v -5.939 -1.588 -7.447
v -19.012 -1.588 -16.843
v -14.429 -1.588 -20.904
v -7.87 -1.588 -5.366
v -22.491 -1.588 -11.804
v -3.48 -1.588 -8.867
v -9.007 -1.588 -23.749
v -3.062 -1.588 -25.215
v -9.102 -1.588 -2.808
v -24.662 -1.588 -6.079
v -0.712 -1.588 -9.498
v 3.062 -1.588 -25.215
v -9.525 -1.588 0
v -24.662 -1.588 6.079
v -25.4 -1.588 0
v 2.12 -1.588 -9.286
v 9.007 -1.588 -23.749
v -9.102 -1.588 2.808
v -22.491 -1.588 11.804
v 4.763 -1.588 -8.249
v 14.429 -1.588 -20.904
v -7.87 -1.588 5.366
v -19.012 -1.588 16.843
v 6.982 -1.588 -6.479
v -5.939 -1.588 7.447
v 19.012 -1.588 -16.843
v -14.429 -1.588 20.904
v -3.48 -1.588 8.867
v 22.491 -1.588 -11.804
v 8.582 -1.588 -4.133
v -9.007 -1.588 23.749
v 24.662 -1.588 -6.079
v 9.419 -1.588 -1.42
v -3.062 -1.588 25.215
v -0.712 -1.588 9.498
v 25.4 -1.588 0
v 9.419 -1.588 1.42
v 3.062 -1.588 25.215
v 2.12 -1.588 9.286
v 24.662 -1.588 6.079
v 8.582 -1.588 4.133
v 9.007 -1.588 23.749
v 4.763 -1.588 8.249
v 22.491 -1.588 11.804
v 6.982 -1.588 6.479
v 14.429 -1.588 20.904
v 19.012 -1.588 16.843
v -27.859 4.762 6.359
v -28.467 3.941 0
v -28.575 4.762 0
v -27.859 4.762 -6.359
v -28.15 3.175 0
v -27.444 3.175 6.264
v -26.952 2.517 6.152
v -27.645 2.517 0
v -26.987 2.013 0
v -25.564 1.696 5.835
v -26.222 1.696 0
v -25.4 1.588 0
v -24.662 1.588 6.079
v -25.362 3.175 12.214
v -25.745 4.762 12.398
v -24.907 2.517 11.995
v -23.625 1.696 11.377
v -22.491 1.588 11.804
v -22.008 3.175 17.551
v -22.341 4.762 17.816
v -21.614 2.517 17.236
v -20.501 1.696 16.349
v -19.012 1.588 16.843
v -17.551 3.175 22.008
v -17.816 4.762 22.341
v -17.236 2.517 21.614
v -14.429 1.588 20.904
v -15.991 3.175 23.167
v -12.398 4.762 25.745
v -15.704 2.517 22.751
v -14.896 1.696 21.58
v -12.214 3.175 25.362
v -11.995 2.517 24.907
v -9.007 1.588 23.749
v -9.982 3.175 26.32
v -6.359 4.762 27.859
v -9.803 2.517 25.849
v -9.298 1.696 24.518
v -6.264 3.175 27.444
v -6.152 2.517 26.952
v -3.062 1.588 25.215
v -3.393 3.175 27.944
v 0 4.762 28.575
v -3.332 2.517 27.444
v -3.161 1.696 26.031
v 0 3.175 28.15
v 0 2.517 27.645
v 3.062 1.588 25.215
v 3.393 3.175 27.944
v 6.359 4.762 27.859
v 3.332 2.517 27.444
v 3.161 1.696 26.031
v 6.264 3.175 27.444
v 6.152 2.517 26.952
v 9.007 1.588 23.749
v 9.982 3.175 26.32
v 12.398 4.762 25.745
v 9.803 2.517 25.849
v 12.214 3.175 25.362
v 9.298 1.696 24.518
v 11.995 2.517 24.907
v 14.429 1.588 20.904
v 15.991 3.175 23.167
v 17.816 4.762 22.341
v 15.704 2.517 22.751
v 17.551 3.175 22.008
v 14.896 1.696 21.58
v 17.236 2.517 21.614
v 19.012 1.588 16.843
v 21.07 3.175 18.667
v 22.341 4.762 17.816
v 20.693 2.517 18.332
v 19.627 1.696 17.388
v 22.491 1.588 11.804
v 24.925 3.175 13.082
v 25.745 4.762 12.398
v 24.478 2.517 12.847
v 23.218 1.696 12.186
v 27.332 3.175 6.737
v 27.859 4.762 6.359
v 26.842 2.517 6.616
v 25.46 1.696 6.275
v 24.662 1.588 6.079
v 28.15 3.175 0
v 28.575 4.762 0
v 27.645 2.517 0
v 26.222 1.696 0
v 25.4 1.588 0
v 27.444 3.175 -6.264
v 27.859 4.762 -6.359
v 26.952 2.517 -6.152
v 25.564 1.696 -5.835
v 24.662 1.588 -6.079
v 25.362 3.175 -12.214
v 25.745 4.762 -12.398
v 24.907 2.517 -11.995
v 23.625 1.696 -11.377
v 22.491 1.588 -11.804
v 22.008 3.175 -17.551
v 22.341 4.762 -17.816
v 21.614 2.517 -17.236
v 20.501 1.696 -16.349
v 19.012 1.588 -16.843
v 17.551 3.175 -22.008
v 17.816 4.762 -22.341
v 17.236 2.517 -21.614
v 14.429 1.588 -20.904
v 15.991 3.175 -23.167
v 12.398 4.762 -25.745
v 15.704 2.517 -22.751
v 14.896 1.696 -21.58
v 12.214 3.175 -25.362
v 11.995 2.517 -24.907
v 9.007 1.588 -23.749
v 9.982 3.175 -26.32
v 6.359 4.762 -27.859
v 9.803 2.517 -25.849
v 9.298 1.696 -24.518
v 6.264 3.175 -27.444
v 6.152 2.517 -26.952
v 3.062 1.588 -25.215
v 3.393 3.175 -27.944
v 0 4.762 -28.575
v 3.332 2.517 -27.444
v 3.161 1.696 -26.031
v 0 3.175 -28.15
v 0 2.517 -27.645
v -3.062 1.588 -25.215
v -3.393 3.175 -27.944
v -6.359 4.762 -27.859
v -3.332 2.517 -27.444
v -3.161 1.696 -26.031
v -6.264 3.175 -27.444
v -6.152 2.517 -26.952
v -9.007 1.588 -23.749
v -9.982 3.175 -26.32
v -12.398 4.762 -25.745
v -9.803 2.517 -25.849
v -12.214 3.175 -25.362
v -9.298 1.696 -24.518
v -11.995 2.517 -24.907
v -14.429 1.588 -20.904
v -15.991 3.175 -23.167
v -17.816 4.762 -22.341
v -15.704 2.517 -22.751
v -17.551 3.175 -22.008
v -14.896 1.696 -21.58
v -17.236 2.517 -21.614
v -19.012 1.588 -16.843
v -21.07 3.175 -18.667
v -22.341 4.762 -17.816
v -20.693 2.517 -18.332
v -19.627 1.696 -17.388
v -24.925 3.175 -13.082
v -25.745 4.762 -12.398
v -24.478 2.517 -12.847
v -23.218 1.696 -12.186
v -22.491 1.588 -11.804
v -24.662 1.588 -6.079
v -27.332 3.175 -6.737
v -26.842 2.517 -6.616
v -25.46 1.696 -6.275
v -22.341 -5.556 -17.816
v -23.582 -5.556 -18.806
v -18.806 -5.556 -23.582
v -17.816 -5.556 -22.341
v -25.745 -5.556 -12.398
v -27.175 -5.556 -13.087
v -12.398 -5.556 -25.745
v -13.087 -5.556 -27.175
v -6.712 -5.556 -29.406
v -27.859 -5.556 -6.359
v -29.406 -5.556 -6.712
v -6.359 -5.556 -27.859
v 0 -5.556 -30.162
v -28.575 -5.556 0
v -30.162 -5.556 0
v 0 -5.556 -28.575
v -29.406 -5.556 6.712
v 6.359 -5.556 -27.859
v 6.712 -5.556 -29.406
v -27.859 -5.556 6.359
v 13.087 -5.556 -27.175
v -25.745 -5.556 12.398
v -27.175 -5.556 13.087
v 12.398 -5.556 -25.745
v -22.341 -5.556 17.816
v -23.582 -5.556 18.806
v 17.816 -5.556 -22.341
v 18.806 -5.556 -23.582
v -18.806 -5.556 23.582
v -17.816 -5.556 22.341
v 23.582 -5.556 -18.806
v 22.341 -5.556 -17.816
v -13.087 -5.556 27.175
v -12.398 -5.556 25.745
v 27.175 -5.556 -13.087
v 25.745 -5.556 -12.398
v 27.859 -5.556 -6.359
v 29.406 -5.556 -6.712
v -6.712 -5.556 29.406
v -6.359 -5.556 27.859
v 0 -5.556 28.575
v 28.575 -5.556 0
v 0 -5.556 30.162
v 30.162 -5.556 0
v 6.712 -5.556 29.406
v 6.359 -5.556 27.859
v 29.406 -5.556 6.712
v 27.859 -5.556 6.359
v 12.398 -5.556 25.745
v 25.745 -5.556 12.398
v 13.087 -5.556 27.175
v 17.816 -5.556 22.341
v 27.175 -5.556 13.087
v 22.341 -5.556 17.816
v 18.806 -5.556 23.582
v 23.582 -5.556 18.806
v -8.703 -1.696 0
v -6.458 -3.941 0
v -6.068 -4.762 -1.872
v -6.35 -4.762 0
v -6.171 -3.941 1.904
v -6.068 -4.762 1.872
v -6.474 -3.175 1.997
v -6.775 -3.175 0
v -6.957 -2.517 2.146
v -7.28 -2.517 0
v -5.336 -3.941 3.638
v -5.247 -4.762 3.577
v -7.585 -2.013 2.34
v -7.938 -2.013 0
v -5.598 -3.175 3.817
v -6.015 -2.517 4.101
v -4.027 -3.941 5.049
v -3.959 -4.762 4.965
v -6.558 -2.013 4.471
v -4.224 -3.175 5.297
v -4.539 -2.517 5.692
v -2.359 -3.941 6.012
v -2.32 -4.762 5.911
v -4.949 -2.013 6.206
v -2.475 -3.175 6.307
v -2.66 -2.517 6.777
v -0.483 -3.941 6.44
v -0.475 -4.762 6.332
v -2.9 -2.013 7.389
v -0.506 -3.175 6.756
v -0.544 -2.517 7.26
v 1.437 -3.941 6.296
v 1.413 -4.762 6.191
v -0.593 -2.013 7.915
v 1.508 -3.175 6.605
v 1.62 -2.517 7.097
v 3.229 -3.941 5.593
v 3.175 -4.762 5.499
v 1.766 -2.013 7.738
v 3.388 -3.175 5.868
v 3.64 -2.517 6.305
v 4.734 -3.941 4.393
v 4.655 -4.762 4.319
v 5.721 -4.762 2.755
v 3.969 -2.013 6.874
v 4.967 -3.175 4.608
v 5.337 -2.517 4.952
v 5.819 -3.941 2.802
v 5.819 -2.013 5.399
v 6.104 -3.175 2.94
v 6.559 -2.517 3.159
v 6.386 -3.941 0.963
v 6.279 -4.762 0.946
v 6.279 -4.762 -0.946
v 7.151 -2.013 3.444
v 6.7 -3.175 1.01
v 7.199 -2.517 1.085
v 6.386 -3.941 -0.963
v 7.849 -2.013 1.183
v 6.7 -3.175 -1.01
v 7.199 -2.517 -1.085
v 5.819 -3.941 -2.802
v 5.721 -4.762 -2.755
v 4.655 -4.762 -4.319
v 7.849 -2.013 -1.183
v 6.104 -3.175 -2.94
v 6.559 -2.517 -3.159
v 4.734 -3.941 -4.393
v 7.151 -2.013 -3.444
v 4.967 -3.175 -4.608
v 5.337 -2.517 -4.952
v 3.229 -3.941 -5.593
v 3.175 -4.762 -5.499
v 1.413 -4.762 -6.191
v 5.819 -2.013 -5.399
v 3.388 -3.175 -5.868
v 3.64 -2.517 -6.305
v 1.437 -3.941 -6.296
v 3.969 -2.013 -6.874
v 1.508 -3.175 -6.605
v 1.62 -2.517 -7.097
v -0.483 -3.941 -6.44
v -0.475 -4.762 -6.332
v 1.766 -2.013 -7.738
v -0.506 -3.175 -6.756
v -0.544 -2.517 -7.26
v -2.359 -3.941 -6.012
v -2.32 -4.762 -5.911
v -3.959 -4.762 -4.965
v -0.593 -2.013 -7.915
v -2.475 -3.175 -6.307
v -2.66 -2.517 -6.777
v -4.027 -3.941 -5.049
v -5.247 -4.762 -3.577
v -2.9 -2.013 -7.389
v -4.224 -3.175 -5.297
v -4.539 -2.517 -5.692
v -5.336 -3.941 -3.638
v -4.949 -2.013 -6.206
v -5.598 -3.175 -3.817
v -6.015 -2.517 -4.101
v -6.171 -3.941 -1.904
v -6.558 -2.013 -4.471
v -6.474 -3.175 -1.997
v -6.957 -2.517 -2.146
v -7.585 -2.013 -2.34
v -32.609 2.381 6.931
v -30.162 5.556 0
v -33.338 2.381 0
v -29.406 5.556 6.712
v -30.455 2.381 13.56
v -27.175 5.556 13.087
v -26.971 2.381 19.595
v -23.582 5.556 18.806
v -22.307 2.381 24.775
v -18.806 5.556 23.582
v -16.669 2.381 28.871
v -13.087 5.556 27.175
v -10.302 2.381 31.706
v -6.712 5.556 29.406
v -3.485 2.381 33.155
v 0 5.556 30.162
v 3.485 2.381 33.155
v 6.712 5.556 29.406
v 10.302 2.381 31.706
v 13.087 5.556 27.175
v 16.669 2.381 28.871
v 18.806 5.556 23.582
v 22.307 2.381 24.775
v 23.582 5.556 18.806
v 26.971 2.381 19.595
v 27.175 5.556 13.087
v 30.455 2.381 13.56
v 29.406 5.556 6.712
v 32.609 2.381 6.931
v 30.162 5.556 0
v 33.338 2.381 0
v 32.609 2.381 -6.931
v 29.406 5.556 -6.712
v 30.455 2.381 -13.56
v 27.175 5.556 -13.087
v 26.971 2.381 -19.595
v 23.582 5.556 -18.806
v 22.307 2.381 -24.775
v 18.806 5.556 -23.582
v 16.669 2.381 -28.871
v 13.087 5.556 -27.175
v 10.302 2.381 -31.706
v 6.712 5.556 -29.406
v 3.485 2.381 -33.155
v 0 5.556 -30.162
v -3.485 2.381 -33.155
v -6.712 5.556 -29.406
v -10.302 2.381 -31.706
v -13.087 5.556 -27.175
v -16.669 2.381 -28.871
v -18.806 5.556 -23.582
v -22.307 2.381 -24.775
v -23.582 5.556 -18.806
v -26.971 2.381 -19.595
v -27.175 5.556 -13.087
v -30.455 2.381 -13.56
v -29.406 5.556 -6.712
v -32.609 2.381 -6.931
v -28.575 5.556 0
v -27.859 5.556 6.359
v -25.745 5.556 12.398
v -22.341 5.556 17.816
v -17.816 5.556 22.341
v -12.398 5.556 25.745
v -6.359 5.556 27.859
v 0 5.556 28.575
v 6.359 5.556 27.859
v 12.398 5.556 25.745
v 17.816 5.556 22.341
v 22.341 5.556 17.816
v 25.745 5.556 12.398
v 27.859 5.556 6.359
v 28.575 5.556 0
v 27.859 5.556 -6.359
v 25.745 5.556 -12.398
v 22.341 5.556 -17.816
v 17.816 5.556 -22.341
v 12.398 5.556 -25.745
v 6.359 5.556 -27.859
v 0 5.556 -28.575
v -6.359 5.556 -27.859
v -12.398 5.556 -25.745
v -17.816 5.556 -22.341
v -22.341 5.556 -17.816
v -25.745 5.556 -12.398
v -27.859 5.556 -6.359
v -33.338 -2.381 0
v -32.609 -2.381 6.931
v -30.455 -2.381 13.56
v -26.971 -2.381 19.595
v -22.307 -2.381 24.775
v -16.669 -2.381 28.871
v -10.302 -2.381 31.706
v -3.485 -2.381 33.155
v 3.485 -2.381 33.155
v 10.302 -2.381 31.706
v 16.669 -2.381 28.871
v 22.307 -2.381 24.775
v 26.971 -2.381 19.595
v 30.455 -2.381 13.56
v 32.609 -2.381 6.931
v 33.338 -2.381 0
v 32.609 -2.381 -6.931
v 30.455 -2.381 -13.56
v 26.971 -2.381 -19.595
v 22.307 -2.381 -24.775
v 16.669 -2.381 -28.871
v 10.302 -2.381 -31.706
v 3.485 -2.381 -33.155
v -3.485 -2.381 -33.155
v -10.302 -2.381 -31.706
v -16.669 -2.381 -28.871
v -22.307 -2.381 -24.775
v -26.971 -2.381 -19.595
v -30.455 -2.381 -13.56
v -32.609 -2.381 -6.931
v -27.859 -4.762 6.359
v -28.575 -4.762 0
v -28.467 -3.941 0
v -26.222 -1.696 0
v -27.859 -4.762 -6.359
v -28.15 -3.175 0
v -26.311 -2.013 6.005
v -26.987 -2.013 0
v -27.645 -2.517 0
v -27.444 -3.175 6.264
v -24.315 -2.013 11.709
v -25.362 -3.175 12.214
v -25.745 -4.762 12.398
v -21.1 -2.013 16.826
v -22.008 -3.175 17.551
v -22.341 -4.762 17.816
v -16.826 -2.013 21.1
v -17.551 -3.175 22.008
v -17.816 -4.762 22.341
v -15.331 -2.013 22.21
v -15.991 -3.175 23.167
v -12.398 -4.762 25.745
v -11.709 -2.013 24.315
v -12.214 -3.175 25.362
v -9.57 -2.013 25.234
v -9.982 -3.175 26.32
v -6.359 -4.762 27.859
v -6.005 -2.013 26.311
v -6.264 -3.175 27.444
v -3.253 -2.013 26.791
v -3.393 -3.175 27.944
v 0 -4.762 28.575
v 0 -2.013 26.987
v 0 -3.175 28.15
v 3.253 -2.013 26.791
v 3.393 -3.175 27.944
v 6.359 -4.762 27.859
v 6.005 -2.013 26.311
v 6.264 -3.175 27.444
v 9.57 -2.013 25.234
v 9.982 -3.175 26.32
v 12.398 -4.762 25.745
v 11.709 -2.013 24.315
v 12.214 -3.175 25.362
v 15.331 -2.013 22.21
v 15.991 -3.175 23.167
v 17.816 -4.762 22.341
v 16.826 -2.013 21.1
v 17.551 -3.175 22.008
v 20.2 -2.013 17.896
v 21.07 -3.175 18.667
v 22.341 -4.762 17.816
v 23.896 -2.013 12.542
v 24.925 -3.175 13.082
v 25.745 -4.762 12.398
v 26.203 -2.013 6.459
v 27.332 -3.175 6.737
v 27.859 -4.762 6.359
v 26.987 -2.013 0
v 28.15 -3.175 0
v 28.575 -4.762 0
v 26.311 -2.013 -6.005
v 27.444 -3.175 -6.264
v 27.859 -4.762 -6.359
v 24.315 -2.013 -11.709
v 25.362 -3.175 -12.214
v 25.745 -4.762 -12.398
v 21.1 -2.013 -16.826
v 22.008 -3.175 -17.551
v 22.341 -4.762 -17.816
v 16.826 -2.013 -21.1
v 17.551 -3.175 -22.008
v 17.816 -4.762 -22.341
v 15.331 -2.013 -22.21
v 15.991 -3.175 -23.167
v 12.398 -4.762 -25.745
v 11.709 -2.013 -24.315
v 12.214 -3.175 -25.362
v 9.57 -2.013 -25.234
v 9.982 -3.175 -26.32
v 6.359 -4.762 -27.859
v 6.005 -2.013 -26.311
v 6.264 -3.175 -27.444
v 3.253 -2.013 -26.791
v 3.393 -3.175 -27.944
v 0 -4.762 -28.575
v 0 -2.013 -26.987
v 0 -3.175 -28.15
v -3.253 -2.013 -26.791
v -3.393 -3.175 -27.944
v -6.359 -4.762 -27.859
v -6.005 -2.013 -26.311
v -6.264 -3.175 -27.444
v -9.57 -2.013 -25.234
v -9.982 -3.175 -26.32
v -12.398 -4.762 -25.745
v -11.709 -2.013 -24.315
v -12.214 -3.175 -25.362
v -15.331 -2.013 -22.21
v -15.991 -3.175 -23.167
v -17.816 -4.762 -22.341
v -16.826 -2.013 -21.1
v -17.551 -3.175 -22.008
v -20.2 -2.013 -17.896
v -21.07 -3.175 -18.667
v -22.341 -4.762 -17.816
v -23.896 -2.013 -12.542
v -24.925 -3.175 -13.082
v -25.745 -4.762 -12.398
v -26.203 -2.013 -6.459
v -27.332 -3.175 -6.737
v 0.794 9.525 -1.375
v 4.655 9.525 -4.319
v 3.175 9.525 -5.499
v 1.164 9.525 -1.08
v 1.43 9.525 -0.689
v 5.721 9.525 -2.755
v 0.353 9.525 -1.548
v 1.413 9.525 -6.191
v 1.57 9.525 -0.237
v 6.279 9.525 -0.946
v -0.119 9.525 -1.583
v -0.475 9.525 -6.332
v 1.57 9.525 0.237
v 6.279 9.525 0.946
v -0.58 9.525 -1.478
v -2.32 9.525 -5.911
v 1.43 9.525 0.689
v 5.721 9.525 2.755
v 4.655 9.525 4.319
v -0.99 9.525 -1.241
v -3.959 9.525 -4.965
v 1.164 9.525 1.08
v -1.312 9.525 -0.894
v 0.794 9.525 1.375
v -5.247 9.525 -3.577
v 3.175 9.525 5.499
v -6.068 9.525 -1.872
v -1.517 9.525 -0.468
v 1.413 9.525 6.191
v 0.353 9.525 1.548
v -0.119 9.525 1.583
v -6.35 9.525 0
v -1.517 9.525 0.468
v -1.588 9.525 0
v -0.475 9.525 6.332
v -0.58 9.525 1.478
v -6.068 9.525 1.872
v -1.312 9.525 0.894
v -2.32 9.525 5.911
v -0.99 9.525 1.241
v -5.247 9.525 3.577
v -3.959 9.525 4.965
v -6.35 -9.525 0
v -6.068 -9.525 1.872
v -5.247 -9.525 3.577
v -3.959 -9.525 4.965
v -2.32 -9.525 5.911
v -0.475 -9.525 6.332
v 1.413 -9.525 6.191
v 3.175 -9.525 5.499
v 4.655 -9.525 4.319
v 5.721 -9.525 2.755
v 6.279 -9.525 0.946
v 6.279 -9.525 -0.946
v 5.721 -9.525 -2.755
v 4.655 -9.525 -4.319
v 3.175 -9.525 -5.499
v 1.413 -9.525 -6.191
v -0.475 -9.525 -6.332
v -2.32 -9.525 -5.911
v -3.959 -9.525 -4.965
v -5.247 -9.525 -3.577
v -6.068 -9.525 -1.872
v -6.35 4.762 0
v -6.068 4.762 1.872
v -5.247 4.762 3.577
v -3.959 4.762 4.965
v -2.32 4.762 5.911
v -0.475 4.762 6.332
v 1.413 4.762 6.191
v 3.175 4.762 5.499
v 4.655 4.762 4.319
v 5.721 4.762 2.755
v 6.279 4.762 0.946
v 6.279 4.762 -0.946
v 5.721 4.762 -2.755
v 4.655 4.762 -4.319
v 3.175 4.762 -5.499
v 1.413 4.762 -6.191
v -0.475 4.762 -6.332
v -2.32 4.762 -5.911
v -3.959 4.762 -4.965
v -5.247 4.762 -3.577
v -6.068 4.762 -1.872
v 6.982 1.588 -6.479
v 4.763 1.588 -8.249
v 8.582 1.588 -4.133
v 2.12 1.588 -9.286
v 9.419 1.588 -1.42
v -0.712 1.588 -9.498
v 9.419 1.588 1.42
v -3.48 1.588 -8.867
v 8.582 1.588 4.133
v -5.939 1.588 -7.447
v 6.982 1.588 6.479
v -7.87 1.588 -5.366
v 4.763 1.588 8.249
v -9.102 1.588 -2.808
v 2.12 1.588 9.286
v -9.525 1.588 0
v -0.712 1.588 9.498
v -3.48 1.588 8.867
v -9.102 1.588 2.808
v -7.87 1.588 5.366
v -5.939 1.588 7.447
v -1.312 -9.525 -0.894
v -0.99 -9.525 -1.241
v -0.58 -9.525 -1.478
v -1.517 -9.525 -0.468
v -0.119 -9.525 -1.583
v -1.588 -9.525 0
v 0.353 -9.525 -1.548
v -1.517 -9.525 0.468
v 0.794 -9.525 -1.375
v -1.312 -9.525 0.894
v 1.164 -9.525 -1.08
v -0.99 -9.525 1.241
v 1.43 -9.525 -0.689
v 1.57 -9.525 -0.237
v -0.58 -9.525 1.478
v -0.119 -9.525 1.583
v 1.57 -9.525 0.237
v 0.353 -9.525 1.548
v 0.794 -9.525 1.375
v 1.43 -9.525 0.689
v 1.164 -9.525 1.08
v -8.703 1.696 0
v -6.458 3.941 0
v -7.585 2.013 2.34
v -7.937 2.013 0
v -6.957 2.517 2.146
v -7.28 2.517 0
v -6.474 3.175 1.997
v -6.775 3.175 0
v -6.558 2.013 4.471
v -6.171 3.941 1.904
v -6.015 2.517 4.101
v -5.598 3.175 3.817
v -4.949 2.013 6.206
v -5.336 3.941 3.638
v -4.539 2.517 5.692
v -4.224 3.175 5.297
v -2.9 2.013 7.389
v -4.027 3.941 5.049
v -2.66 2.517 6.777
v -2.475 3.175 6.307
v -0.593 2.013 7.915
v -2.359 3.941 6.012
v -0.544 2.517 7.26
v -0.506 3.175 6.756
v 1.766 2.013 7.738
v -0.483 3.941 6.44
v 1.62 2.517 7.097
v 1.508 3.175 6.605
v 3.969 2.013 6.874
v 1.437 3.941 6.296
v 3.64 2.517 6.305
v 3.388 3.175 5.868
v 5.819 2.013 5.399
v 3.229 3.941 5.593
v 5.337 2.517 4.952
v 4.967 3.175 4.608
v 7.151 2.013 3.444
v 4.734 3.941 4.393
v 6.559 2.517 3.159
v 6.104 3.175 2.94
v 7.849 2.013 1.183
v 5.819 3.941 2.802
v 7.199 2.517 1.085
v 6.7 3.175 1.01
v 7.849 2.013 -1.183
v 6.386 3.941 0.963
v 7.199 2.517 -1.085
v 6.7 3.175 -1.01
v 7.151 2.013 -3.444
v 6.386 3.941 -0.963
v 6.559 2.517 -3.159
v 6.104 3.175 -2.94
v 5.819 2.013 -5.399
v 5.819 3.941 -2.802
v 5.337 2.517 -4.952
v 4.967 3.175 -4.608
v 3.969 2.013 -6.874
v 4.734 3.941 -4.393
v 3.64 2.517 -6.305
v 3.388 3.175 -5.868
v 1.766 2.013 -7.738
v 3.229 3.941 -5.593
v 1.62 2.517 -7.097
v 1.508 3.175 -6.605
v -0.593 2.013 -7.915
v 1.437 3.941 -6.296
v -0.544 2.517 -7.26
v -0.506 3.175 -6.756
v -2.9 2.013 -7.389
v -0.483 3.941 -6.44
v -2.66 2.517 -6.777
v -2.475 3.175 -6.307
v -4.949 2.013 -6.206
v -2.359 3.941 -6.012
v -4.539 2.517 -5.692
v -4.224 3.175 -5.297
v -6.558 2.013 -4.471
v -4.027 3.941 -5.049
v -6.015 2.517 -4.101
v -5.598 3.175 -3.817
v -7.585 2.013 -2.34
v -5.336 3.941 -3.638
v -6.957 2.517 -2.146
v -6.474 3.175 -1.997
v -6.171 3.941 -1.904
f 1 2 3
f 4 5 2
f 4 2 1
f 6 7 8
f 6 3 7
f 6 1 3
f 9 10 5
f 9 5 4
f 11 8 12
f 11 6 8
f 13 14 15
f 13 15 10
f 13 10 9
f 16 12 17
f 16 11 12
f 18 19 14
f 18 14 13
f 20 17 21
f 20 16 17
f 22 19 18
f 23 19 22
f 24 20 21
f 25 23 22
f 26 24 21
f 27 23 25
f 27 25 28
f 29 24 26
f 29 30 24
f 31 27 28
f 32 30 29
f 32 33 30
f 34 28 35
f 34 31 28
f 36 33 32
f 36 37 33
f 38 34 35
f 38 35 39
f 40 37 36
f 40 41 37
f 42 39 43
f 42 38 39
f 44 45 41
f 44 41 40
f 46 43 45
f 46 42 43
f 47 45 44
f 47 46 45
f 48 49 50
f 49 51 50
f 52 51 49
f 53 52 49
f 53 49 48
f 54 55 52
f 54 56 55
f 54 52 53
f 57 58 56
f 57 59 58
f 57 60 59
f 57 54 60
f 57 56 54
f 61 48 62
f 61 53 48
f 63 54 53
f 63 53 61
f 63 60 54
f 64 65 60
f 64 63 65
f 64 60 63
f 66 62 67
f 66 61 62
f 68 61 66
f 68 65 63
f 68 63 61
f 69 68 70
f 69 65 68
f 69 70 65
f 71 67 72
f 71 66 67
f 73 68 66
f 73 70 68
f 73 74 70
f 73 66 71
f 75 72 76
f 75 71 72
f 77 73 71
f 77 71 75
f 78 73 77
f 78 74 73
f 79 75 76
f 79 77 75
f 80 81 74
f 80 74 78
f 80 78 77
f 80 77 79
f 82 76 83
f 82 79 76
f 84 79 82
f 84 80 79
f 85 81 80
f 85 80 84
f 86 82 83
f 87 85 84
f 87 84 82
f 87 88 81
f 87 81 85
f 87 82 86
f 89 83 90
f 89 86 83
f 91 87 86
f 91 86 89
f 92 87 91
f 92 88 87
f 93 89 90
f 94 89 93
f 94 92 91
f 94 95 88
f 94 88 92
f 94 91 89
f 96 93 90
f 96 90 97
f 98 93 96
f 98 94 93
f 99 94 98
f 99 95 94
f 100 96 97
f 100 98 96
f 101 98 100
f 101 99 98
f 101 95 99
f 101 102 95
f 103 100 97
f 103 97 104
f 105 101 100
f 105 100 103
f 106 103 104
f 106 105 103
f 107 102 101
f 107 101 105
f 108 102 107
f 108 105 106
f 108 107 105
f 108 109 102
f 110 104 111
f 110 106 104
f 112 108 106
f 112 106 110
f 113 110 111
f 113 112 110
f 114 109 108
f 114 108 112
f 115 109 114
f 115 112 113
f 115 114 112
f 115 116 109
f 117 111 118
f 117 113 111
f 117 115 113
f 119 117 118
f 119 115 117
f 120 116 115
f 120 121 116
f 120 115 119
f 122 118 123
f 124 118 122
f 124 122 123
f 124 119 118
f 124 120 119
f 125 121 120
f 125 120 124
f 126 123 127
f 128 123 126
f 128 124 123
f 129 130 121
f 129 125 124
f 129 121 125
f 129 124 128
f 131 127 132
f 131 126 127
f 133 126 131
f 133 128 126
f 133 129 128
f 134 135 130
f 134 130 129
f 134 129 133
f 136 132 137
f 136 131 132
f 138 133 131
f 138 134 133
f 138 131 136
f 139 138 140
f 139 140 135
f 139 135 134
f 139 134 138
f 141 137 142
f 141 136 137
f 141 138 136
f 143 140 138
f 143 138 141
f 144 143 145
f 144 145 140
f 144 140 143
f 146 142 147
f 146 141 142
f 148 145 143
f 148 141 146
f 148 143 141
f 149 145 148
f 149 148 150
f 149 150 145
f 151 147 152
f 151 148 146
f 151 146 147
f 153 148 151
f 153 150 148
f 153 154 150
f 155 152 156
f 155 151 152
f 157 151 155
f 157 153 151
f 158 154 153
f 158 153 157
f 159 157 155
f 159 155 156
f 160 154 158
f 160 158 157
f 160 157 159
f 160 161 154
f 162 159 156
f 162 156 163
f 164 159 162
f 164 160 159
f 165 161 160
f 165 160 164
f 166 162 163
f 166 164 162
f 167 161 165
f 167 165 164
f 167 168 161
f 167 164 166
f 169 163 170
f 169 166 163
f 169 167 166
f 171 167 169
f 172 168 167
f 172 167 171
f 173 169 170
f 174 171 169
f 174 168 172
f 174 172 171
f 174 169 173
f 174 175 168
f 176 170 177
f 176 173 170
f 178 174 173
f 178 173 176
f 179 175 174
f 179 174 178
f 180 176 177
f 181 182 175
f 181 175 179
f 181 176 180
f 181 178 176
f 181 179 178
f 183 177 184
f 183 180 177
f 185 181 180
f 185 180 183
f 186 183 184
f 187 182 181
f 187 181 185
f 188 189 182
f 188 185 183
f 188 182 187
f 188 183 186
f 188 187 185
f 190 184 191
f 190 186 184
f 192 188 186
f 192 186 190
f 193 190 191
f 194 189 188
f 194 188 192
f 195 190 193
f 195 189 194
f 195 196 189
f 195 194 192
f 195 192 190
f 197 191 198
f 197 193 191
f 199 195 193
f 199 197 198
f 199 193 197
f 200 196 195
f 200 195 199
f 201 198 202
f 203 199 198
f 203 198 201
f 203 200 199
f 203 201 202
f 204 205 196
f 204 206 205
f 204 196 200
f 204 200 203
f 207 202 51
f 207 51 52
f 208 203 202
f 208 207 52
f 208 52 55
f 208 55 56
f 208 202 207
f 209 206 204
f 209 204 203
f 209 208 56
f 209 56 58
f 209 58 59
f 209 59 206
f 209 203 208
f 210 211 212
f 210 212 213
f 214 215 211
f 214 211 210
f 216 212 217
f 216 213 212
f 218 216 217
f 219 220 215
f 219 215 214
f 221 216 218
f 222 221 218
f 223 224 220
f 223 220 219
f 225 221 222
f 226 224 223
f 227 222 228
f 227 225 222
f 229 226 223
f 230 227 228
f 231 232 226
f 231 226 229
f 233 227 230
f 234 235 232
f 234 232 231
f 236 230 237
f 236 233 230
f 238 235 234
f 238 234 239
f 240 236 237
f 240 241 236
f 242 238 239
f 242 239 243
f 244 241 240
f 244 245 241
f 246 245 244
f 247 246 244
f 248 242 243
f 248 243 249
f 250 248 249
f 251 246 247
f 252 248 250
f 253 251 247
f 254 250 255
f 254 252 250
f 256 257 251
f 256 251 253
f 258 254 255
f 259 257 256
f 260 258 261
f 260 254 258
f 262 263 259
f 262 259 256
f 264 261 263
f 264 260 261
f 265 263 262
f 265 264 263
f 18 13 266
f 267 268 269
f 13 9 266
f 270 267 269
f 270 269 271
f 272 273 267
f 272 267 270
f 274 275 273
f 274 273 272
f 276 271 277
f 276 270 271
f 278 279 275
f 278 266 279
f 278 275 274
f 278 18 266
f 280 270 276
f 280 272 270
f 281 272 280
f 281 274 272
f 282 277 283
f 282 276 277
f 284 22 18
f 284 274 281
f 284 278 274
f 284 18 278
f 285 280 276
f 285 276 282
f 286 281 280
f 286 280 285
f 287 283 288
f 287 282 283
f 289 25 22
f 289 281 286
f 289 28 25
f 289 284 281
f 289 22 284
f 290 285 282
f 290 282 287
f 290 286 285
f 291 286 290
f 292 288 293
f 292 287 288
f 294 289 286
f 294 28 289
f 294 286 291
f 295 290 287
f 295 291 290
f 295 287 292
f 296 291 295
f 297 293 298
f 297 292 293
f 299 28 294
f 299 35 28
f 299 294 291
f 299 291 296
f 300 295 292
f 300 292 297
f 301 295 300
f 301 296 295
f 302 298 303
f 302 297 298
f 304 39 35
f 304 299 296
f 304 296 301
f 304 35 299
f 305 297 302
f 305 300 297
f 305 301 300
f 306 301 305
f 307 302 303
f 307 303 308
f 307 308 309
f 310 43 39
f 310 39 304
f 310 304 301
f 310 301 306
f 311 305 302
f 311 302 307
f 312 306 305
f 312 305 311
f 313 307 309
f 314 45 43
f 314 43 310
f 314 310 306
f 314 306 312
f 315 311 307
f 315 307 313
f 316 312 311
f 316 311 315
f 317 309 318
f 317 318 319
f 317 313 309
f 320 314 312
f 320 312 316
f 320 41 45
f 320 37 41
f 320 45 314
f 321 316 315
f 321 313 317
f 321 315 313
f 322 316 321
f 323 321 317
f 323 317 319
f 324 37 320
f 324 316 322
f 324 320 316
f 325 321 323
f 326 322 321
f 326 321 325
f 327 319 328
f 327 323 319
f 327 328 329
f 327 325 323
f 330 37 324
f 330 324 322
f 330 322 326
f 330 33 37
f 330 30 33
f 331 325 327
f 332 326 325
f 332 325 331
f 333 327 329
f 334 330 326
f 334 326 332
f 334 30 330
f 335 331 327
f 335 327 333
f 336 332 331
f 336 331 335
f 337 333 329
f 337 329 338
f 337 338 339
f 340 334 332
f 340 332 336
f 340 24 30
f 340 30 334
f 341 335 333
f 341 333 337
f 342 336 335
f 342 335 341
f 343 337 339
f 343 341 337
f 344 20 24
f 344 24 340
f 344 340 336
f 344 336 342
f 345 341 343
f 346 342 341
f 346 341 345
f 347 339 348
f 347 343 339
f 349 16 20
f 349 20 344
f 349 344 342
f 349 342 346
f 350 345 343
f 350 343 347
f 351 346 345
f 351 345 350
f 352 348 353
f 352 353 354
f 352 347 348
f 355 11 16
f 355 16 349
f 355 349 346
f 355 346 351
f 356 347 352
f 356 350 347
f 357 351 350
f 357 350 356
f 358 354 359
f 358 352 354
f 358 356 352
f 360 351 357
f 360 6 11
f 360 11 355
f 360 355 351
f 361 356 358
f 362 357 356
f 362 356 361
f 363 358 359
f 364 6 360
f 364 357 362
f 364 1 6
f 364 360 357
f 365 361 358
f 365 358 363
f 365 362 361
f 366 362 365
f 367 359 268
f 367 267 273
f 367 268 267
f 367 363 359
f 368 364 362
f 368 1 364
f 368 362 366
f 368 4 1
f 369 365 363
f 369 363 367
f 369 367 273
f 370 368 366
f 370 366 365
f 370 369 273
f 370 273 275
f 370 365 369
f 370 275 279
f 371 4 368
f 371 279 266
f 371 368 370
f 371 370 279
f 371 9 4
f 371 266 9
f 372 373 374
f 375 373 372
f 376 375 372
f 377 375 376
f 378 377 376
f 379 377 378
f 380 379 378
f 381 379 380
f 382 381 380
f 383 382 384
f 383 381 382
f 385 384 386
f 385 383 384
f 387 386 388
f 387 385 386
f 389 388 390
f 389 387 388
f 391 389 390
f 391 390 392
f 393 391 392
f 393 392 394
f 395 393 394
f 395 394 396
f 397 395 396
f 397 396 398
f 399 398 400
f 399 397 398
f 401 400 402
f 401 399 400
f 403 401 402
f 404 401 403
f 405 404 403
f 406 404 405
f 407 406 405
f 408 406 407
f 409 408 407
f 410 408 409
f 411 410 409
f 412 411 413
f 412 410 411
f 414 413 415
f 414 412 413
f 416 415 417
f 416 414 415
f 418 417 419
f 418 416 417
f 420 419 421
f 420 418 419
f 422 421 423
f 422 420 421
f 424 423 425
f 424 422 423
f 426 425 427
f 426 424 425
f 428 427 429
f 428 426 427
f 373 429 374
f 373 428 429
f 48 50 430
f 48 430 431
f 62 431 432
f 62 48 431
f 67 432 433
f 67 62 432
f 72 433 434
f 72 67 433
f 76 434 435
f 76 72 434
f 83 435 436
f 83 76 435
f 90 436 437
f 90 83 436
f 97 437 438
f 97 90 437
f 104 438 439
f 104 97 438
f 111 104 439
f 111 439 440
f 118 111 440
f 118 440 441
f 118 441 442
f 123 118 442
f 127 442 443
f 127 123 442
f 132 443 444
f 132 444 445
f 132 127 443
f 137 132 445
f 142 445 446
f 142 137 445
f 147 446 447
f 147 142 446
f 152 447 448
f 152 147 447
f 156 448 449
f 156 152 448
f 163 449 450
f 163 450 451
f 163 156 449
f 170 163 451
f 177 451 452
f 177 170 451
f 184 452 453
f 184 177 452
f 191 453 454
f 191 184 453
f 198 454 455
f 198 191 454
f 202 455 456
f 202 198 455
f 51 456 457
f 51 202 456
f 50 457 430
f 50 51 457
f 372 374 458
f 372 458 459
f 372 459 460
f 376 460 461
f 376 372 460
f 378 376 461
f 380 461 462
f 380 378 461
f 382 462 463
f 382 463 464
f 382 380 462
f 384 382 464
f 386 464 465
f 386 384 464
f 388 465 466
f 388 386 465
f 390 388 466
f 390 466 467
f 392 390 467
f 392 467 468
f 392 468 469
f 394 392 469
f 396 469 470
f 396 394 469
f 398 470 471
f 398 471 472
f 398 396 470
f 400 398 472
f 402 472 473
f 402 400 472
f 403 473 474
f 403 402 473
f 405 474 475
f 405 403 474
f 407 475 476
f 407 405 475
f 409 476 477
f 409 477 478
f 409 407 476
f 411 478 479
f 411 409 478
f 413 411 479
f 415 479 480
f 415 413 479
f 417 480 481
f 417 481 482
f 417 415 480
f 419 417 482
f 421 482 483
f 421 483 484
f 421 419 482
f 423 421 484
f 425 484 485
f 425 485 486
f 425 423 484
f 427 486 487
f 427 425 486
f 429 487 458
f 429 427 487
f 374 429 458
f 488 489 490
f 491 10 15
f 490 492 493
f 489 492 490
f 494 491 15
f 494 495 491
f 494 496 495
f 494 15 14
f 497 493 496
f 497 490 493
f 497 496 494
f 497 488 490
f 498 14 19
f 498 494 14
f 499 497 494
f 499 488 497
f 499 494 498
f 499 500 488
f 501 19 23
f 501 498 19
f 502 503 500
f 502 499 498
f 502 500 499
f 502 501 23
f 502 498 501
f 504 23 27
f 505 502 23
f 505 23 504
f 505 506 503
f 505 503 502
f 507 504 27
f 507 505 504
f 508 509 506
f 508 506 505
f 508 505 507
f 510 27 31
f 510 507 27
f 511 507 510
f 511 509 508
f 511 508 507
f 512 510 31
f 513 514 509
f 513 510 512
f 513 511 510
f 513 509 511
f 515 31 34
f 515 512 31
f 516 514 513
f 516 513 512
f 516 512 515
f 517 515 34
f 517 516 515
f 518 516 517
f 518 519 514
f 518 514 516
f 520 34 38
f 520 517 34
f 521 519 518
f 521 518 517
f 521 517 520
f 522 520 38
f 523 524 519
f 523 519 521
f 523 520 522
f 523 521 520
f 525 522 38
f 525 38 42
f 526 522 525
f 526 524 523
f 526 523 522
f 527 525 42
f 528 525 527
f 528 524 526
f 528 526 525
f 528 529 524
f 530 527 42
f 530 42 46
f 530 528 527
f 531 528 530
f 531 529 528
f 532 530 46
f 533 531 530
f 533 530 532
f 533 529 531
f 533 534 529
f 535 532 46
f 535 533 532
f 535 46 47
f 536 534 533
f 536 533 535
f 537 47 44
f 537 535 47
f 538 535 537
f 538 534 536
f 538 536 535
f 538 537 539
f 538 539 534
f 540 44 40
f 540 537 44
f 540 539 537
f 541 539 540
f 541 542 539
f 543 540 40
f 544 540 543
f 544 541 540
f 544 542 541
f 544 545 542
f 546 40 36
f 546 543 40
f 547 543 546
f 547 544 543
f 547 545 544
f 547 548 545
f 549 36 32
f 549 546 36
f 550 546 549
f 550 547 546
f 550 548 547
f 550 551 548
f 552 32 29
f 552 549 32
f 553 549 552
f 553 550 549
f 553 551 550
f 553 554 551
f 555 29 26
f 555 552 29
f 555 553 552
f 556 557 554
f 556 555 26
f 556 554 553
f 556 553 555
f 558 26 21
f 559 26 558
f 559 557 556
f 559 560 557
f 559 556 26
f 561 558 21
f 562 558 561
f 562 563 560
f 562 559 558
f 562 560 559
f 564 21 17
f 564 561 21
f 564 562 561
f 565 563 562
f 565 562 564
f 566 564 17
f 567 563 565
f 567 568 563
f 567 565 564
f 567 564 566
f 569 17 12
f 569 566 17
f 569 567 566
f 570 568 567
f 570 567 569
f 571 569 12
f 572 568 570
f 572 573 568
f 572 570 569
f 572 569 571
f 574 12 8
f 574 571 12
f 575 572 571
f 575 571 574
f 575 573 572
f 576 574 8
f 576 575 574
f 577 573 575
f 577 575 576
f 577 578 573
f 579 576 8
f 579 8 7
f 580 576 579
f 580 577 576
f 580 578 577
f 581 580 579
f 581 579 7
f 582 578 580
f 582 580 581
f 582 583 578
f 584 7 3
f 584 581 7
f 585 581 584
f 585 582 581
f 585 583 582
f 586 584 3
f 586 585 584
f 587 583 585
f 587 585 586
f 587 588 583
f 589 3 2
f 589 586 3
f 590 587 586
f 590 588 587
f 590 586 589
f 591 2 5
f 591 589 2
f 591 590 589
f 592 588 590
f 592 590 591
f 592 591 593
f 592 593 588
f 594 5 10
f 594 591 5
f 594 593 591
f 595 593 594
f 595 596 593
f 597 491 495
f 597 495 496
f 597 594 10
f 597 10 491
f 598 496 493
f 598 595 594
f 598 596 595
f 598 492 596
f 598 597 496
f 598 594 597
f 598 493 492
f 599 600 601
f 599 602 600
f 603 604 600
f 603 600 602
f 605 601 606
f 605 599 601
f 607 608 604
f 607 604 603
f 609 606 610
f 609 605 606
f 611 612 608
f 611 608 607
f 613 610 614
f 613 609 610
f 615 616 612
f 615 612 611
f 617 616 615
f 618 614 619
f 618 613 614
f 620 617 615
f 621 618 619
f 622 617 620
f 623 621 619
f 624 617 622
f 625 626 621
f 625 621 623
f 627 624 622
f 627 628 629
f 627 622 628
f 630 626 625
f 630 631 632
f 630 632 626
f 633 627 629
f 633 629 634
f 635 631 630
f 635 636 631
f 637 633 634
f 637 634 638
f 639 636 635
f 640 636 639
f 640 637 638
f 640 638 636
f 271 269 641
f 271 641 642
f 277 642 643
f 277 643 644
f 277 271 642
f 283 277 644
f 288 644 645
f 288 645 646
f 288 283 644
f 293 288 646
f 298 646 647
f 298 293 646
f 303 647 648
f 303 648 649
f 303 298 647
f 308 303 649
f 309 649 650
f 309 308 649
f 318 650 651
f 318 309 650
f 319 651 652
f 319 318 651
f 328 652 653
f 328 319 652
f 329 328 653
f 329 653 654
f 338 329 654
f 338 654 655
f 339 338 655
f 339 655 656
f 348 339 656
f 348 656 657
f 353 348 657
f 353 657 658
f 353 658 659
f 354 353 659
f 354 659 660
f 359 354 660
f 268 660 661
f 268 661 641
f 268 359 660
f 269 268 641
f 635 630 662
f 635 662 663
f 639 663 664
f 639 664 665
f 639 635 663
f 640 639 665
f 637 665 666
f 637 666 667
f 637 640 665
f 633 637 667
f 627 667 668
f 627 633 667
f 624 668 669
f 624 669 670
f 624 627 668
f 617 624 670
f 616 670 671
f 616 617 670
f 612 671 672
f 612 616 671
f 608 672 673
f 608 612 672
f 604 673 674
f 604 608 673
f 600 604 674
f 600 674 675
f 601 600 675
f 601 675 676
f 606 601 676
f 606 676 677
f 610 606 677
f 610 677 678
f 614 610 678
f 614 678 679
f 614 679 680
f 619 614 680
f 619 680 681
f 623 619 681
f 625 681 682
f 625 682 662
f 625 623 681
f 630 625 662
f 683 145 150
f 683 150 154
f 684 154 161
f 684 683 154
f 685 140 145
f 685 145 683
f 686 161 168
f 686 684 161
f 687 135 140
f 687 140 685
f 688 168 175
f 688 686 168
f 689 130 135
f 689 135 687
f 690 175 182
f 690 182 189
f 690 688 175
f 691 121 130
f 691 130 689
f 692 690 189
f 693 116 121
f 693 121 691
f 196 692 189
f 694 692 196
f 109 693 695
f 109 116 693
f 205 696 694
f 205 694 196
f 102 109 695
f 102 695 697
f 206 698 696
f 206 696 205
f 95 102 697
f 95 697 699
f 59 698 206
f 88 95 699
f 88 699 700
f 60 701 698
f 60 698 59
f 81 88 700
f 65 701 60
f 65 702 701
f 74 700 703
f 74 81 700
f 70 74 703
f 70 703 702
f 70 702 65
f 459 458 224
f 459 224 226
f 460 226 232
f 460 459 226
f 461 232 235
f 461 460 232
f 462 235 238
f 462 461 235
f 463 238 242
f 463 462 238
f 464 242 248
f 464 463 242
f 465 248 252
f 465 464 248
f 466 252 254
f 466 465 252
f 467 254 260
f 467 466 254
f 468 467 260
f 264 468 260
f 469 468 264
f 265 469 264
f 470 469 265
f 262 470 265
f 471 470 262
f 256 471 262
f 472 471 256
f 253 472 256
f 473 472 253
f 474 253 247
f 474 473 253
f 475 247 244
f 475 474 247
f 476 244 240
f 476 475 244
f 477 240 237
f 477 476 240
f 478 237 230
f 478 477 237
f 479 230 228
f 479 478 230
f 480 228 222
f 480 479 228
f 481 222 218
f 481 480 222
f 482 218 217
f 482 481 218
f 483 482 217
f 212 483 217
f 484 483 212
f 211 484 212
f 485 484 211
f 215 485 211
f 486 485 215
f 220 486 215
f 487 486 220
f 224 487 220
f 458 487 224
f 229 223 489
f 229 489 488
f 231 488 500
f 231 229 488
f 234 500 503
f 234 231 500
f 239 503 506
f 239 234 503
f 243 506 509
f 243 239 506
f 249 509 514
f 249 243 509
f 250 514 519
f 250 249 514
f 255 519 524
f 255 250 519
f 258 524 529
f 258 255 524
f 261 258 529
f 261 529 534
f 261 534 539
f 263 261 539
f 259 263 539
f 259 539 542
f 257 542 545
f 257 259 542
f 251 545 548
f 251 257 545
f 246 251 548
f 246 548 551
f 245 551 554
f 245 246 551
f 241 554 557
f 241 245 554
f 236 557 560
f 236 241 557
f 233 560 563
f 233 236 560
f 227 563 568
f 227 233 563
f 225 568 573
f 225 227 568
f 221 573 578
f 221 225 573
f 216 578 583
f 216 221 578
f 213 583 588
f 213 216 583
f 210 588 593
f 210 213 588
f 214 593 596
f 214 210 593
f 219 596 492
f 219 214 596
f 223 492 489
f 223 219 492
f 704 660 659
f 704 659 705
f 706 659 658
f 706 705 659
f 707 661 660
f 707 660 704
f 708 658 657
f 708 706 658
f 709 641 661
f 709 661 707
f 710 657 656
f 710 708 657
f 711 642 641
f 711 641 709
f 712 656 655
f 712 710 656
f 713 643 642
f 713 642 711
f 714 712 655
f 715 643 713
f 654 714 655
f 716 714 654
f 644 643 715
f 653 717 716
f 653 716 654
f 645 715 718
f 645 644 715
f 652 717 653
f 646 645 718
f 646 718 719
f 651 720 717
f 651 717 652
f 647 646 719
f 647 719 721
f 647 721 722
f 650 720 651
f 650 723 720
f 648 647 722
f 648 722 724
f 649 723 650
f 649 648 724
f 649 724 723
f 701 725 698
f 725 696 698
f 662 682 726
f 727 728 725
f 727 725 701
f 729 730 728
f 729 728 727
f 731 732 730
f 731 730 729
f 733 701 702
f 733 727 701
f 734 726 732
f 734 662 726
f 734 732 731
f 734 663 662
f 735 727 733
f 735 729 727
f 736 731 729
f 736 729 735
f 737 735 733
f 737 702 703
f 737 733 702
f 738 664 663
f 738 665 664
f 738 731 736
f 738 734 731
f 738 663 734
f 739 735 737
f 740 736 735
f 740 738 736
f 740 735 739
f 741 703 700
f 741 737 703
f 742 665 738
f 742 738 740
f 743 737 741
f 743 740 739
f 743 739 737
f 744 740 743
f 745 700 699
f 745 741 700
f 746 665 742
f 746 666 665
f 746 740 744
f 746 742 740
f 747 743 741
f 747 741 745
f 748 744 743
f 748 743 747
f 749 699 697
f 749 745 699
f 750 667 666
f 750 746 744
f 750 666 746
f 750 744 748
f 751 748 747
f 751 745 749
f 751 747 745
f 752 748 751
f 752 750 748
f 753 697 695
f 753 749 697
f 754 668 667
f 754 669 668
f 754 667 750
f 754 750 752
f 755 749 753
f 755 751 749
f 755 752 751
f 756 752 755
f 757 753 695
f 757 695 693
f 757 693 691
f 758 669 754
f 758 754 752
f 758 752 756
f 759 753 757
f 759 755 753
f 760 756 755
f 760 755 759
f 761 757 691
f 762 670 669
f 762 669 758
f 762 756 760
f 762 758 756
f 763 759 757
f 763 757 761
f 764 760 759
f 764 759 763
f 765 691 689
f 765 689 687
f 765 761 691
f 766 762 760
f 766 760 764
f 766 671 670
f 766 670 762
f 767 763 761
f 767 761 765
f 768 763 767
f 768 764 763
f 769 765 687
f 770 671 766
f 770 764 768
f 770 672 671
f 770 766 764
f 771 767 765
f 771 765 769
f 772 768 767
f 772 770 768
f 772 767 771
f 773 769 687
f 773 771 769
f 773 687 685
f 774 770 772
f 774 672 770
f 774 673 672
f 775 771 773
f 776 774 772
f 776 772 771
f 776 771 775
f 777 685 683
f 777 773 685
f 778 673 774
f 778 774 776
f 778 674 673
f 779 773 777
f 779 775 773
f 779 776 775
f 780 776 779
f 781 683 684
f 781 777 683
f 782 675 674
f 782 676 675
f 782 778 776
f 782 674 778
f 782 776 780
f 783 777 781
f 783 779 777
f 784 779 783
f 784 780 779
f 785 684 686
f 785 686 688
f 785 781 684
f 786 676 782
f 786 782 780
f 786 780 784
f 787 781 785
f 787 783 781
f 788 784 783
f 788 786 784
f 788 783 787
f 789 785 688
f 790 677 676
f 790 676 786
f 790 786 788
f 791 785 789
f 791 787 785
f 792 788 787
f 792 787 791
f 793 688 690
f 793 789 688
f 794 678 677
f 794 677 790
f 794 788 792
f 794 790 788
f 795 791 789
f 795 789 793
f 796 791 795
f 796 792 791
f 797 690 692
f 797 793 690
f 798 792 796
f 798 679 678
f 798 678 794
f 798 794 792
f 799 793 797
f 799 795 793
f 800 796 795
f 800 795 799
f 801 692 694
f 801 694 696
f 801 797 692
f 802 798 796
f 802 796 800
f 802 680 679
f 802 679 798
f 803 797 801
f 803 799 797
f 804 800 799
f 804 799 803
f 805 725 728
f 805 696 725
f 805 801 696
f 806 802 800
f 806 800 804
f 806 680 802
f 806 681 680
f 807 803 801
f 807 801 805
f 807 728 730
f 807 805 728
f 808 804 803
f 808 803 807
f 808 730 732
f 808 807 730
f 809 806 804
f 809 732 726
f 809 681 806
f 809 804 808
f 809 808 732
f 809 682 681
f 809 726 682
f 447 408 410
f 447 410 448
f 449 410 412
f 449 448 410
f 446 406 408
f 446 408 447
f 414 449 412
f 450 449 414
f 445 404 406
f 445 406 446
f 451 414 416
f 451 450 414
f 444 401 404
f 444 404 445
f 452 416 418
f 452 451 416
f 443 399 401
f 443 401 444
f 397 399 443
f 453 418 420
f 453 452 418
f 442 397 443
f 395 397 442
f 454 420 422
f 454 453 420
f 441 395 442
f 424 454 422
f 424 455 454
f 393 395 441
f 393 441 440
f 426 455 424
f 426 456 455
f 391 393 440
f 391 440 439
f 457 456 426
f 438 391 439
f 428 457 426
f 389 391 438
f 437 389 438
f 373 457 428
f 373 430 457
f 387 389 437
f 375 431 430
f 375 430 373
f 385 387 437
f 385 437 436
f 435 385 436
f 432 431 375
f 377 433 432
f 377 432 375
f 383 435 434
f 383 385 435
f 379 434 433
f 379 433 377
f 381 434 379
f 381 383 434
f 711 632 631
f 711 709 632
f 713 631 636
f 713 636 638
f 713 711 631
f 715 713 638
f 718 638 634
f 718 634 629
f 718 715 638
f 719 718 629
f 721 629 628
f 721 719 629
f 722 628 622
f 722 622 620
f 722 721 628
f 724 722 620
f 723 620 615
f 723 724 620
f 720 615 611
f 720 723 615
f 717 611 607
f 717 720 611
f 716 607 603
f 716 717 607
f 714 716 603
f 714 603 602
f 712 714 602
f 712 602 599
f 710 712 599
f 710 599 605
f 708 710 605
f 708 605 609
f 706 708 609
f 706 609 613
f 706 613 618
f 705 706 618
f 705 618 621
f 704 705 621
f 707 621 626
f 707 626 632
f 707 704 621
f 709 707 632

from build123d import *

# Parameters (mm, degrees)
FILLET1_R     = 3.175
CHAMFER1_SIZE = 3.175


with BuildPart() as part:
    # Sketch1 → Revolve1 (revolve)
    with BuildSketch(Plane.XY):
        Polygon((-6.35, 9.525), (-1.5875, 9.525), (-1.5875, -9.525), (-6.35, -9.525), (-6.35, -1.5875), (-28.575, -1.5875), (-28.575, -5.55625), (-33.3375, -5.55625), (-33.3375, 5.55625), (-28.575, 5.55625), (-28.575, 1.5875), (-6.35, 1.5875), align=None)
    revolve(axis=Axis((0, -9.525, 0), (0, 1, 0)))

    # Fillet1
    fillet1_edges = [part.edges().sort_by_distance(p)[0] for p in [
        (28.575, -1.5875, 0),
        (6.35, -1.5875, 0),
        (6.35, 1.5875, 0),
        (28.575, 1.5875, 0),
    ]]
    fillet(fillet1_edges, radius=FILLET1_R)

    # Chamfer1
    chamfer1_edges = [part.edges().sort_by_distance(p)[0] for p in [
        (33.3375, 5.55625, 0),
        (33.3375, -5.55625, 0),
    ]]
    chamfer(chamfer1_edges, length=CHAMFER1_SIZE)


solid = part.part
